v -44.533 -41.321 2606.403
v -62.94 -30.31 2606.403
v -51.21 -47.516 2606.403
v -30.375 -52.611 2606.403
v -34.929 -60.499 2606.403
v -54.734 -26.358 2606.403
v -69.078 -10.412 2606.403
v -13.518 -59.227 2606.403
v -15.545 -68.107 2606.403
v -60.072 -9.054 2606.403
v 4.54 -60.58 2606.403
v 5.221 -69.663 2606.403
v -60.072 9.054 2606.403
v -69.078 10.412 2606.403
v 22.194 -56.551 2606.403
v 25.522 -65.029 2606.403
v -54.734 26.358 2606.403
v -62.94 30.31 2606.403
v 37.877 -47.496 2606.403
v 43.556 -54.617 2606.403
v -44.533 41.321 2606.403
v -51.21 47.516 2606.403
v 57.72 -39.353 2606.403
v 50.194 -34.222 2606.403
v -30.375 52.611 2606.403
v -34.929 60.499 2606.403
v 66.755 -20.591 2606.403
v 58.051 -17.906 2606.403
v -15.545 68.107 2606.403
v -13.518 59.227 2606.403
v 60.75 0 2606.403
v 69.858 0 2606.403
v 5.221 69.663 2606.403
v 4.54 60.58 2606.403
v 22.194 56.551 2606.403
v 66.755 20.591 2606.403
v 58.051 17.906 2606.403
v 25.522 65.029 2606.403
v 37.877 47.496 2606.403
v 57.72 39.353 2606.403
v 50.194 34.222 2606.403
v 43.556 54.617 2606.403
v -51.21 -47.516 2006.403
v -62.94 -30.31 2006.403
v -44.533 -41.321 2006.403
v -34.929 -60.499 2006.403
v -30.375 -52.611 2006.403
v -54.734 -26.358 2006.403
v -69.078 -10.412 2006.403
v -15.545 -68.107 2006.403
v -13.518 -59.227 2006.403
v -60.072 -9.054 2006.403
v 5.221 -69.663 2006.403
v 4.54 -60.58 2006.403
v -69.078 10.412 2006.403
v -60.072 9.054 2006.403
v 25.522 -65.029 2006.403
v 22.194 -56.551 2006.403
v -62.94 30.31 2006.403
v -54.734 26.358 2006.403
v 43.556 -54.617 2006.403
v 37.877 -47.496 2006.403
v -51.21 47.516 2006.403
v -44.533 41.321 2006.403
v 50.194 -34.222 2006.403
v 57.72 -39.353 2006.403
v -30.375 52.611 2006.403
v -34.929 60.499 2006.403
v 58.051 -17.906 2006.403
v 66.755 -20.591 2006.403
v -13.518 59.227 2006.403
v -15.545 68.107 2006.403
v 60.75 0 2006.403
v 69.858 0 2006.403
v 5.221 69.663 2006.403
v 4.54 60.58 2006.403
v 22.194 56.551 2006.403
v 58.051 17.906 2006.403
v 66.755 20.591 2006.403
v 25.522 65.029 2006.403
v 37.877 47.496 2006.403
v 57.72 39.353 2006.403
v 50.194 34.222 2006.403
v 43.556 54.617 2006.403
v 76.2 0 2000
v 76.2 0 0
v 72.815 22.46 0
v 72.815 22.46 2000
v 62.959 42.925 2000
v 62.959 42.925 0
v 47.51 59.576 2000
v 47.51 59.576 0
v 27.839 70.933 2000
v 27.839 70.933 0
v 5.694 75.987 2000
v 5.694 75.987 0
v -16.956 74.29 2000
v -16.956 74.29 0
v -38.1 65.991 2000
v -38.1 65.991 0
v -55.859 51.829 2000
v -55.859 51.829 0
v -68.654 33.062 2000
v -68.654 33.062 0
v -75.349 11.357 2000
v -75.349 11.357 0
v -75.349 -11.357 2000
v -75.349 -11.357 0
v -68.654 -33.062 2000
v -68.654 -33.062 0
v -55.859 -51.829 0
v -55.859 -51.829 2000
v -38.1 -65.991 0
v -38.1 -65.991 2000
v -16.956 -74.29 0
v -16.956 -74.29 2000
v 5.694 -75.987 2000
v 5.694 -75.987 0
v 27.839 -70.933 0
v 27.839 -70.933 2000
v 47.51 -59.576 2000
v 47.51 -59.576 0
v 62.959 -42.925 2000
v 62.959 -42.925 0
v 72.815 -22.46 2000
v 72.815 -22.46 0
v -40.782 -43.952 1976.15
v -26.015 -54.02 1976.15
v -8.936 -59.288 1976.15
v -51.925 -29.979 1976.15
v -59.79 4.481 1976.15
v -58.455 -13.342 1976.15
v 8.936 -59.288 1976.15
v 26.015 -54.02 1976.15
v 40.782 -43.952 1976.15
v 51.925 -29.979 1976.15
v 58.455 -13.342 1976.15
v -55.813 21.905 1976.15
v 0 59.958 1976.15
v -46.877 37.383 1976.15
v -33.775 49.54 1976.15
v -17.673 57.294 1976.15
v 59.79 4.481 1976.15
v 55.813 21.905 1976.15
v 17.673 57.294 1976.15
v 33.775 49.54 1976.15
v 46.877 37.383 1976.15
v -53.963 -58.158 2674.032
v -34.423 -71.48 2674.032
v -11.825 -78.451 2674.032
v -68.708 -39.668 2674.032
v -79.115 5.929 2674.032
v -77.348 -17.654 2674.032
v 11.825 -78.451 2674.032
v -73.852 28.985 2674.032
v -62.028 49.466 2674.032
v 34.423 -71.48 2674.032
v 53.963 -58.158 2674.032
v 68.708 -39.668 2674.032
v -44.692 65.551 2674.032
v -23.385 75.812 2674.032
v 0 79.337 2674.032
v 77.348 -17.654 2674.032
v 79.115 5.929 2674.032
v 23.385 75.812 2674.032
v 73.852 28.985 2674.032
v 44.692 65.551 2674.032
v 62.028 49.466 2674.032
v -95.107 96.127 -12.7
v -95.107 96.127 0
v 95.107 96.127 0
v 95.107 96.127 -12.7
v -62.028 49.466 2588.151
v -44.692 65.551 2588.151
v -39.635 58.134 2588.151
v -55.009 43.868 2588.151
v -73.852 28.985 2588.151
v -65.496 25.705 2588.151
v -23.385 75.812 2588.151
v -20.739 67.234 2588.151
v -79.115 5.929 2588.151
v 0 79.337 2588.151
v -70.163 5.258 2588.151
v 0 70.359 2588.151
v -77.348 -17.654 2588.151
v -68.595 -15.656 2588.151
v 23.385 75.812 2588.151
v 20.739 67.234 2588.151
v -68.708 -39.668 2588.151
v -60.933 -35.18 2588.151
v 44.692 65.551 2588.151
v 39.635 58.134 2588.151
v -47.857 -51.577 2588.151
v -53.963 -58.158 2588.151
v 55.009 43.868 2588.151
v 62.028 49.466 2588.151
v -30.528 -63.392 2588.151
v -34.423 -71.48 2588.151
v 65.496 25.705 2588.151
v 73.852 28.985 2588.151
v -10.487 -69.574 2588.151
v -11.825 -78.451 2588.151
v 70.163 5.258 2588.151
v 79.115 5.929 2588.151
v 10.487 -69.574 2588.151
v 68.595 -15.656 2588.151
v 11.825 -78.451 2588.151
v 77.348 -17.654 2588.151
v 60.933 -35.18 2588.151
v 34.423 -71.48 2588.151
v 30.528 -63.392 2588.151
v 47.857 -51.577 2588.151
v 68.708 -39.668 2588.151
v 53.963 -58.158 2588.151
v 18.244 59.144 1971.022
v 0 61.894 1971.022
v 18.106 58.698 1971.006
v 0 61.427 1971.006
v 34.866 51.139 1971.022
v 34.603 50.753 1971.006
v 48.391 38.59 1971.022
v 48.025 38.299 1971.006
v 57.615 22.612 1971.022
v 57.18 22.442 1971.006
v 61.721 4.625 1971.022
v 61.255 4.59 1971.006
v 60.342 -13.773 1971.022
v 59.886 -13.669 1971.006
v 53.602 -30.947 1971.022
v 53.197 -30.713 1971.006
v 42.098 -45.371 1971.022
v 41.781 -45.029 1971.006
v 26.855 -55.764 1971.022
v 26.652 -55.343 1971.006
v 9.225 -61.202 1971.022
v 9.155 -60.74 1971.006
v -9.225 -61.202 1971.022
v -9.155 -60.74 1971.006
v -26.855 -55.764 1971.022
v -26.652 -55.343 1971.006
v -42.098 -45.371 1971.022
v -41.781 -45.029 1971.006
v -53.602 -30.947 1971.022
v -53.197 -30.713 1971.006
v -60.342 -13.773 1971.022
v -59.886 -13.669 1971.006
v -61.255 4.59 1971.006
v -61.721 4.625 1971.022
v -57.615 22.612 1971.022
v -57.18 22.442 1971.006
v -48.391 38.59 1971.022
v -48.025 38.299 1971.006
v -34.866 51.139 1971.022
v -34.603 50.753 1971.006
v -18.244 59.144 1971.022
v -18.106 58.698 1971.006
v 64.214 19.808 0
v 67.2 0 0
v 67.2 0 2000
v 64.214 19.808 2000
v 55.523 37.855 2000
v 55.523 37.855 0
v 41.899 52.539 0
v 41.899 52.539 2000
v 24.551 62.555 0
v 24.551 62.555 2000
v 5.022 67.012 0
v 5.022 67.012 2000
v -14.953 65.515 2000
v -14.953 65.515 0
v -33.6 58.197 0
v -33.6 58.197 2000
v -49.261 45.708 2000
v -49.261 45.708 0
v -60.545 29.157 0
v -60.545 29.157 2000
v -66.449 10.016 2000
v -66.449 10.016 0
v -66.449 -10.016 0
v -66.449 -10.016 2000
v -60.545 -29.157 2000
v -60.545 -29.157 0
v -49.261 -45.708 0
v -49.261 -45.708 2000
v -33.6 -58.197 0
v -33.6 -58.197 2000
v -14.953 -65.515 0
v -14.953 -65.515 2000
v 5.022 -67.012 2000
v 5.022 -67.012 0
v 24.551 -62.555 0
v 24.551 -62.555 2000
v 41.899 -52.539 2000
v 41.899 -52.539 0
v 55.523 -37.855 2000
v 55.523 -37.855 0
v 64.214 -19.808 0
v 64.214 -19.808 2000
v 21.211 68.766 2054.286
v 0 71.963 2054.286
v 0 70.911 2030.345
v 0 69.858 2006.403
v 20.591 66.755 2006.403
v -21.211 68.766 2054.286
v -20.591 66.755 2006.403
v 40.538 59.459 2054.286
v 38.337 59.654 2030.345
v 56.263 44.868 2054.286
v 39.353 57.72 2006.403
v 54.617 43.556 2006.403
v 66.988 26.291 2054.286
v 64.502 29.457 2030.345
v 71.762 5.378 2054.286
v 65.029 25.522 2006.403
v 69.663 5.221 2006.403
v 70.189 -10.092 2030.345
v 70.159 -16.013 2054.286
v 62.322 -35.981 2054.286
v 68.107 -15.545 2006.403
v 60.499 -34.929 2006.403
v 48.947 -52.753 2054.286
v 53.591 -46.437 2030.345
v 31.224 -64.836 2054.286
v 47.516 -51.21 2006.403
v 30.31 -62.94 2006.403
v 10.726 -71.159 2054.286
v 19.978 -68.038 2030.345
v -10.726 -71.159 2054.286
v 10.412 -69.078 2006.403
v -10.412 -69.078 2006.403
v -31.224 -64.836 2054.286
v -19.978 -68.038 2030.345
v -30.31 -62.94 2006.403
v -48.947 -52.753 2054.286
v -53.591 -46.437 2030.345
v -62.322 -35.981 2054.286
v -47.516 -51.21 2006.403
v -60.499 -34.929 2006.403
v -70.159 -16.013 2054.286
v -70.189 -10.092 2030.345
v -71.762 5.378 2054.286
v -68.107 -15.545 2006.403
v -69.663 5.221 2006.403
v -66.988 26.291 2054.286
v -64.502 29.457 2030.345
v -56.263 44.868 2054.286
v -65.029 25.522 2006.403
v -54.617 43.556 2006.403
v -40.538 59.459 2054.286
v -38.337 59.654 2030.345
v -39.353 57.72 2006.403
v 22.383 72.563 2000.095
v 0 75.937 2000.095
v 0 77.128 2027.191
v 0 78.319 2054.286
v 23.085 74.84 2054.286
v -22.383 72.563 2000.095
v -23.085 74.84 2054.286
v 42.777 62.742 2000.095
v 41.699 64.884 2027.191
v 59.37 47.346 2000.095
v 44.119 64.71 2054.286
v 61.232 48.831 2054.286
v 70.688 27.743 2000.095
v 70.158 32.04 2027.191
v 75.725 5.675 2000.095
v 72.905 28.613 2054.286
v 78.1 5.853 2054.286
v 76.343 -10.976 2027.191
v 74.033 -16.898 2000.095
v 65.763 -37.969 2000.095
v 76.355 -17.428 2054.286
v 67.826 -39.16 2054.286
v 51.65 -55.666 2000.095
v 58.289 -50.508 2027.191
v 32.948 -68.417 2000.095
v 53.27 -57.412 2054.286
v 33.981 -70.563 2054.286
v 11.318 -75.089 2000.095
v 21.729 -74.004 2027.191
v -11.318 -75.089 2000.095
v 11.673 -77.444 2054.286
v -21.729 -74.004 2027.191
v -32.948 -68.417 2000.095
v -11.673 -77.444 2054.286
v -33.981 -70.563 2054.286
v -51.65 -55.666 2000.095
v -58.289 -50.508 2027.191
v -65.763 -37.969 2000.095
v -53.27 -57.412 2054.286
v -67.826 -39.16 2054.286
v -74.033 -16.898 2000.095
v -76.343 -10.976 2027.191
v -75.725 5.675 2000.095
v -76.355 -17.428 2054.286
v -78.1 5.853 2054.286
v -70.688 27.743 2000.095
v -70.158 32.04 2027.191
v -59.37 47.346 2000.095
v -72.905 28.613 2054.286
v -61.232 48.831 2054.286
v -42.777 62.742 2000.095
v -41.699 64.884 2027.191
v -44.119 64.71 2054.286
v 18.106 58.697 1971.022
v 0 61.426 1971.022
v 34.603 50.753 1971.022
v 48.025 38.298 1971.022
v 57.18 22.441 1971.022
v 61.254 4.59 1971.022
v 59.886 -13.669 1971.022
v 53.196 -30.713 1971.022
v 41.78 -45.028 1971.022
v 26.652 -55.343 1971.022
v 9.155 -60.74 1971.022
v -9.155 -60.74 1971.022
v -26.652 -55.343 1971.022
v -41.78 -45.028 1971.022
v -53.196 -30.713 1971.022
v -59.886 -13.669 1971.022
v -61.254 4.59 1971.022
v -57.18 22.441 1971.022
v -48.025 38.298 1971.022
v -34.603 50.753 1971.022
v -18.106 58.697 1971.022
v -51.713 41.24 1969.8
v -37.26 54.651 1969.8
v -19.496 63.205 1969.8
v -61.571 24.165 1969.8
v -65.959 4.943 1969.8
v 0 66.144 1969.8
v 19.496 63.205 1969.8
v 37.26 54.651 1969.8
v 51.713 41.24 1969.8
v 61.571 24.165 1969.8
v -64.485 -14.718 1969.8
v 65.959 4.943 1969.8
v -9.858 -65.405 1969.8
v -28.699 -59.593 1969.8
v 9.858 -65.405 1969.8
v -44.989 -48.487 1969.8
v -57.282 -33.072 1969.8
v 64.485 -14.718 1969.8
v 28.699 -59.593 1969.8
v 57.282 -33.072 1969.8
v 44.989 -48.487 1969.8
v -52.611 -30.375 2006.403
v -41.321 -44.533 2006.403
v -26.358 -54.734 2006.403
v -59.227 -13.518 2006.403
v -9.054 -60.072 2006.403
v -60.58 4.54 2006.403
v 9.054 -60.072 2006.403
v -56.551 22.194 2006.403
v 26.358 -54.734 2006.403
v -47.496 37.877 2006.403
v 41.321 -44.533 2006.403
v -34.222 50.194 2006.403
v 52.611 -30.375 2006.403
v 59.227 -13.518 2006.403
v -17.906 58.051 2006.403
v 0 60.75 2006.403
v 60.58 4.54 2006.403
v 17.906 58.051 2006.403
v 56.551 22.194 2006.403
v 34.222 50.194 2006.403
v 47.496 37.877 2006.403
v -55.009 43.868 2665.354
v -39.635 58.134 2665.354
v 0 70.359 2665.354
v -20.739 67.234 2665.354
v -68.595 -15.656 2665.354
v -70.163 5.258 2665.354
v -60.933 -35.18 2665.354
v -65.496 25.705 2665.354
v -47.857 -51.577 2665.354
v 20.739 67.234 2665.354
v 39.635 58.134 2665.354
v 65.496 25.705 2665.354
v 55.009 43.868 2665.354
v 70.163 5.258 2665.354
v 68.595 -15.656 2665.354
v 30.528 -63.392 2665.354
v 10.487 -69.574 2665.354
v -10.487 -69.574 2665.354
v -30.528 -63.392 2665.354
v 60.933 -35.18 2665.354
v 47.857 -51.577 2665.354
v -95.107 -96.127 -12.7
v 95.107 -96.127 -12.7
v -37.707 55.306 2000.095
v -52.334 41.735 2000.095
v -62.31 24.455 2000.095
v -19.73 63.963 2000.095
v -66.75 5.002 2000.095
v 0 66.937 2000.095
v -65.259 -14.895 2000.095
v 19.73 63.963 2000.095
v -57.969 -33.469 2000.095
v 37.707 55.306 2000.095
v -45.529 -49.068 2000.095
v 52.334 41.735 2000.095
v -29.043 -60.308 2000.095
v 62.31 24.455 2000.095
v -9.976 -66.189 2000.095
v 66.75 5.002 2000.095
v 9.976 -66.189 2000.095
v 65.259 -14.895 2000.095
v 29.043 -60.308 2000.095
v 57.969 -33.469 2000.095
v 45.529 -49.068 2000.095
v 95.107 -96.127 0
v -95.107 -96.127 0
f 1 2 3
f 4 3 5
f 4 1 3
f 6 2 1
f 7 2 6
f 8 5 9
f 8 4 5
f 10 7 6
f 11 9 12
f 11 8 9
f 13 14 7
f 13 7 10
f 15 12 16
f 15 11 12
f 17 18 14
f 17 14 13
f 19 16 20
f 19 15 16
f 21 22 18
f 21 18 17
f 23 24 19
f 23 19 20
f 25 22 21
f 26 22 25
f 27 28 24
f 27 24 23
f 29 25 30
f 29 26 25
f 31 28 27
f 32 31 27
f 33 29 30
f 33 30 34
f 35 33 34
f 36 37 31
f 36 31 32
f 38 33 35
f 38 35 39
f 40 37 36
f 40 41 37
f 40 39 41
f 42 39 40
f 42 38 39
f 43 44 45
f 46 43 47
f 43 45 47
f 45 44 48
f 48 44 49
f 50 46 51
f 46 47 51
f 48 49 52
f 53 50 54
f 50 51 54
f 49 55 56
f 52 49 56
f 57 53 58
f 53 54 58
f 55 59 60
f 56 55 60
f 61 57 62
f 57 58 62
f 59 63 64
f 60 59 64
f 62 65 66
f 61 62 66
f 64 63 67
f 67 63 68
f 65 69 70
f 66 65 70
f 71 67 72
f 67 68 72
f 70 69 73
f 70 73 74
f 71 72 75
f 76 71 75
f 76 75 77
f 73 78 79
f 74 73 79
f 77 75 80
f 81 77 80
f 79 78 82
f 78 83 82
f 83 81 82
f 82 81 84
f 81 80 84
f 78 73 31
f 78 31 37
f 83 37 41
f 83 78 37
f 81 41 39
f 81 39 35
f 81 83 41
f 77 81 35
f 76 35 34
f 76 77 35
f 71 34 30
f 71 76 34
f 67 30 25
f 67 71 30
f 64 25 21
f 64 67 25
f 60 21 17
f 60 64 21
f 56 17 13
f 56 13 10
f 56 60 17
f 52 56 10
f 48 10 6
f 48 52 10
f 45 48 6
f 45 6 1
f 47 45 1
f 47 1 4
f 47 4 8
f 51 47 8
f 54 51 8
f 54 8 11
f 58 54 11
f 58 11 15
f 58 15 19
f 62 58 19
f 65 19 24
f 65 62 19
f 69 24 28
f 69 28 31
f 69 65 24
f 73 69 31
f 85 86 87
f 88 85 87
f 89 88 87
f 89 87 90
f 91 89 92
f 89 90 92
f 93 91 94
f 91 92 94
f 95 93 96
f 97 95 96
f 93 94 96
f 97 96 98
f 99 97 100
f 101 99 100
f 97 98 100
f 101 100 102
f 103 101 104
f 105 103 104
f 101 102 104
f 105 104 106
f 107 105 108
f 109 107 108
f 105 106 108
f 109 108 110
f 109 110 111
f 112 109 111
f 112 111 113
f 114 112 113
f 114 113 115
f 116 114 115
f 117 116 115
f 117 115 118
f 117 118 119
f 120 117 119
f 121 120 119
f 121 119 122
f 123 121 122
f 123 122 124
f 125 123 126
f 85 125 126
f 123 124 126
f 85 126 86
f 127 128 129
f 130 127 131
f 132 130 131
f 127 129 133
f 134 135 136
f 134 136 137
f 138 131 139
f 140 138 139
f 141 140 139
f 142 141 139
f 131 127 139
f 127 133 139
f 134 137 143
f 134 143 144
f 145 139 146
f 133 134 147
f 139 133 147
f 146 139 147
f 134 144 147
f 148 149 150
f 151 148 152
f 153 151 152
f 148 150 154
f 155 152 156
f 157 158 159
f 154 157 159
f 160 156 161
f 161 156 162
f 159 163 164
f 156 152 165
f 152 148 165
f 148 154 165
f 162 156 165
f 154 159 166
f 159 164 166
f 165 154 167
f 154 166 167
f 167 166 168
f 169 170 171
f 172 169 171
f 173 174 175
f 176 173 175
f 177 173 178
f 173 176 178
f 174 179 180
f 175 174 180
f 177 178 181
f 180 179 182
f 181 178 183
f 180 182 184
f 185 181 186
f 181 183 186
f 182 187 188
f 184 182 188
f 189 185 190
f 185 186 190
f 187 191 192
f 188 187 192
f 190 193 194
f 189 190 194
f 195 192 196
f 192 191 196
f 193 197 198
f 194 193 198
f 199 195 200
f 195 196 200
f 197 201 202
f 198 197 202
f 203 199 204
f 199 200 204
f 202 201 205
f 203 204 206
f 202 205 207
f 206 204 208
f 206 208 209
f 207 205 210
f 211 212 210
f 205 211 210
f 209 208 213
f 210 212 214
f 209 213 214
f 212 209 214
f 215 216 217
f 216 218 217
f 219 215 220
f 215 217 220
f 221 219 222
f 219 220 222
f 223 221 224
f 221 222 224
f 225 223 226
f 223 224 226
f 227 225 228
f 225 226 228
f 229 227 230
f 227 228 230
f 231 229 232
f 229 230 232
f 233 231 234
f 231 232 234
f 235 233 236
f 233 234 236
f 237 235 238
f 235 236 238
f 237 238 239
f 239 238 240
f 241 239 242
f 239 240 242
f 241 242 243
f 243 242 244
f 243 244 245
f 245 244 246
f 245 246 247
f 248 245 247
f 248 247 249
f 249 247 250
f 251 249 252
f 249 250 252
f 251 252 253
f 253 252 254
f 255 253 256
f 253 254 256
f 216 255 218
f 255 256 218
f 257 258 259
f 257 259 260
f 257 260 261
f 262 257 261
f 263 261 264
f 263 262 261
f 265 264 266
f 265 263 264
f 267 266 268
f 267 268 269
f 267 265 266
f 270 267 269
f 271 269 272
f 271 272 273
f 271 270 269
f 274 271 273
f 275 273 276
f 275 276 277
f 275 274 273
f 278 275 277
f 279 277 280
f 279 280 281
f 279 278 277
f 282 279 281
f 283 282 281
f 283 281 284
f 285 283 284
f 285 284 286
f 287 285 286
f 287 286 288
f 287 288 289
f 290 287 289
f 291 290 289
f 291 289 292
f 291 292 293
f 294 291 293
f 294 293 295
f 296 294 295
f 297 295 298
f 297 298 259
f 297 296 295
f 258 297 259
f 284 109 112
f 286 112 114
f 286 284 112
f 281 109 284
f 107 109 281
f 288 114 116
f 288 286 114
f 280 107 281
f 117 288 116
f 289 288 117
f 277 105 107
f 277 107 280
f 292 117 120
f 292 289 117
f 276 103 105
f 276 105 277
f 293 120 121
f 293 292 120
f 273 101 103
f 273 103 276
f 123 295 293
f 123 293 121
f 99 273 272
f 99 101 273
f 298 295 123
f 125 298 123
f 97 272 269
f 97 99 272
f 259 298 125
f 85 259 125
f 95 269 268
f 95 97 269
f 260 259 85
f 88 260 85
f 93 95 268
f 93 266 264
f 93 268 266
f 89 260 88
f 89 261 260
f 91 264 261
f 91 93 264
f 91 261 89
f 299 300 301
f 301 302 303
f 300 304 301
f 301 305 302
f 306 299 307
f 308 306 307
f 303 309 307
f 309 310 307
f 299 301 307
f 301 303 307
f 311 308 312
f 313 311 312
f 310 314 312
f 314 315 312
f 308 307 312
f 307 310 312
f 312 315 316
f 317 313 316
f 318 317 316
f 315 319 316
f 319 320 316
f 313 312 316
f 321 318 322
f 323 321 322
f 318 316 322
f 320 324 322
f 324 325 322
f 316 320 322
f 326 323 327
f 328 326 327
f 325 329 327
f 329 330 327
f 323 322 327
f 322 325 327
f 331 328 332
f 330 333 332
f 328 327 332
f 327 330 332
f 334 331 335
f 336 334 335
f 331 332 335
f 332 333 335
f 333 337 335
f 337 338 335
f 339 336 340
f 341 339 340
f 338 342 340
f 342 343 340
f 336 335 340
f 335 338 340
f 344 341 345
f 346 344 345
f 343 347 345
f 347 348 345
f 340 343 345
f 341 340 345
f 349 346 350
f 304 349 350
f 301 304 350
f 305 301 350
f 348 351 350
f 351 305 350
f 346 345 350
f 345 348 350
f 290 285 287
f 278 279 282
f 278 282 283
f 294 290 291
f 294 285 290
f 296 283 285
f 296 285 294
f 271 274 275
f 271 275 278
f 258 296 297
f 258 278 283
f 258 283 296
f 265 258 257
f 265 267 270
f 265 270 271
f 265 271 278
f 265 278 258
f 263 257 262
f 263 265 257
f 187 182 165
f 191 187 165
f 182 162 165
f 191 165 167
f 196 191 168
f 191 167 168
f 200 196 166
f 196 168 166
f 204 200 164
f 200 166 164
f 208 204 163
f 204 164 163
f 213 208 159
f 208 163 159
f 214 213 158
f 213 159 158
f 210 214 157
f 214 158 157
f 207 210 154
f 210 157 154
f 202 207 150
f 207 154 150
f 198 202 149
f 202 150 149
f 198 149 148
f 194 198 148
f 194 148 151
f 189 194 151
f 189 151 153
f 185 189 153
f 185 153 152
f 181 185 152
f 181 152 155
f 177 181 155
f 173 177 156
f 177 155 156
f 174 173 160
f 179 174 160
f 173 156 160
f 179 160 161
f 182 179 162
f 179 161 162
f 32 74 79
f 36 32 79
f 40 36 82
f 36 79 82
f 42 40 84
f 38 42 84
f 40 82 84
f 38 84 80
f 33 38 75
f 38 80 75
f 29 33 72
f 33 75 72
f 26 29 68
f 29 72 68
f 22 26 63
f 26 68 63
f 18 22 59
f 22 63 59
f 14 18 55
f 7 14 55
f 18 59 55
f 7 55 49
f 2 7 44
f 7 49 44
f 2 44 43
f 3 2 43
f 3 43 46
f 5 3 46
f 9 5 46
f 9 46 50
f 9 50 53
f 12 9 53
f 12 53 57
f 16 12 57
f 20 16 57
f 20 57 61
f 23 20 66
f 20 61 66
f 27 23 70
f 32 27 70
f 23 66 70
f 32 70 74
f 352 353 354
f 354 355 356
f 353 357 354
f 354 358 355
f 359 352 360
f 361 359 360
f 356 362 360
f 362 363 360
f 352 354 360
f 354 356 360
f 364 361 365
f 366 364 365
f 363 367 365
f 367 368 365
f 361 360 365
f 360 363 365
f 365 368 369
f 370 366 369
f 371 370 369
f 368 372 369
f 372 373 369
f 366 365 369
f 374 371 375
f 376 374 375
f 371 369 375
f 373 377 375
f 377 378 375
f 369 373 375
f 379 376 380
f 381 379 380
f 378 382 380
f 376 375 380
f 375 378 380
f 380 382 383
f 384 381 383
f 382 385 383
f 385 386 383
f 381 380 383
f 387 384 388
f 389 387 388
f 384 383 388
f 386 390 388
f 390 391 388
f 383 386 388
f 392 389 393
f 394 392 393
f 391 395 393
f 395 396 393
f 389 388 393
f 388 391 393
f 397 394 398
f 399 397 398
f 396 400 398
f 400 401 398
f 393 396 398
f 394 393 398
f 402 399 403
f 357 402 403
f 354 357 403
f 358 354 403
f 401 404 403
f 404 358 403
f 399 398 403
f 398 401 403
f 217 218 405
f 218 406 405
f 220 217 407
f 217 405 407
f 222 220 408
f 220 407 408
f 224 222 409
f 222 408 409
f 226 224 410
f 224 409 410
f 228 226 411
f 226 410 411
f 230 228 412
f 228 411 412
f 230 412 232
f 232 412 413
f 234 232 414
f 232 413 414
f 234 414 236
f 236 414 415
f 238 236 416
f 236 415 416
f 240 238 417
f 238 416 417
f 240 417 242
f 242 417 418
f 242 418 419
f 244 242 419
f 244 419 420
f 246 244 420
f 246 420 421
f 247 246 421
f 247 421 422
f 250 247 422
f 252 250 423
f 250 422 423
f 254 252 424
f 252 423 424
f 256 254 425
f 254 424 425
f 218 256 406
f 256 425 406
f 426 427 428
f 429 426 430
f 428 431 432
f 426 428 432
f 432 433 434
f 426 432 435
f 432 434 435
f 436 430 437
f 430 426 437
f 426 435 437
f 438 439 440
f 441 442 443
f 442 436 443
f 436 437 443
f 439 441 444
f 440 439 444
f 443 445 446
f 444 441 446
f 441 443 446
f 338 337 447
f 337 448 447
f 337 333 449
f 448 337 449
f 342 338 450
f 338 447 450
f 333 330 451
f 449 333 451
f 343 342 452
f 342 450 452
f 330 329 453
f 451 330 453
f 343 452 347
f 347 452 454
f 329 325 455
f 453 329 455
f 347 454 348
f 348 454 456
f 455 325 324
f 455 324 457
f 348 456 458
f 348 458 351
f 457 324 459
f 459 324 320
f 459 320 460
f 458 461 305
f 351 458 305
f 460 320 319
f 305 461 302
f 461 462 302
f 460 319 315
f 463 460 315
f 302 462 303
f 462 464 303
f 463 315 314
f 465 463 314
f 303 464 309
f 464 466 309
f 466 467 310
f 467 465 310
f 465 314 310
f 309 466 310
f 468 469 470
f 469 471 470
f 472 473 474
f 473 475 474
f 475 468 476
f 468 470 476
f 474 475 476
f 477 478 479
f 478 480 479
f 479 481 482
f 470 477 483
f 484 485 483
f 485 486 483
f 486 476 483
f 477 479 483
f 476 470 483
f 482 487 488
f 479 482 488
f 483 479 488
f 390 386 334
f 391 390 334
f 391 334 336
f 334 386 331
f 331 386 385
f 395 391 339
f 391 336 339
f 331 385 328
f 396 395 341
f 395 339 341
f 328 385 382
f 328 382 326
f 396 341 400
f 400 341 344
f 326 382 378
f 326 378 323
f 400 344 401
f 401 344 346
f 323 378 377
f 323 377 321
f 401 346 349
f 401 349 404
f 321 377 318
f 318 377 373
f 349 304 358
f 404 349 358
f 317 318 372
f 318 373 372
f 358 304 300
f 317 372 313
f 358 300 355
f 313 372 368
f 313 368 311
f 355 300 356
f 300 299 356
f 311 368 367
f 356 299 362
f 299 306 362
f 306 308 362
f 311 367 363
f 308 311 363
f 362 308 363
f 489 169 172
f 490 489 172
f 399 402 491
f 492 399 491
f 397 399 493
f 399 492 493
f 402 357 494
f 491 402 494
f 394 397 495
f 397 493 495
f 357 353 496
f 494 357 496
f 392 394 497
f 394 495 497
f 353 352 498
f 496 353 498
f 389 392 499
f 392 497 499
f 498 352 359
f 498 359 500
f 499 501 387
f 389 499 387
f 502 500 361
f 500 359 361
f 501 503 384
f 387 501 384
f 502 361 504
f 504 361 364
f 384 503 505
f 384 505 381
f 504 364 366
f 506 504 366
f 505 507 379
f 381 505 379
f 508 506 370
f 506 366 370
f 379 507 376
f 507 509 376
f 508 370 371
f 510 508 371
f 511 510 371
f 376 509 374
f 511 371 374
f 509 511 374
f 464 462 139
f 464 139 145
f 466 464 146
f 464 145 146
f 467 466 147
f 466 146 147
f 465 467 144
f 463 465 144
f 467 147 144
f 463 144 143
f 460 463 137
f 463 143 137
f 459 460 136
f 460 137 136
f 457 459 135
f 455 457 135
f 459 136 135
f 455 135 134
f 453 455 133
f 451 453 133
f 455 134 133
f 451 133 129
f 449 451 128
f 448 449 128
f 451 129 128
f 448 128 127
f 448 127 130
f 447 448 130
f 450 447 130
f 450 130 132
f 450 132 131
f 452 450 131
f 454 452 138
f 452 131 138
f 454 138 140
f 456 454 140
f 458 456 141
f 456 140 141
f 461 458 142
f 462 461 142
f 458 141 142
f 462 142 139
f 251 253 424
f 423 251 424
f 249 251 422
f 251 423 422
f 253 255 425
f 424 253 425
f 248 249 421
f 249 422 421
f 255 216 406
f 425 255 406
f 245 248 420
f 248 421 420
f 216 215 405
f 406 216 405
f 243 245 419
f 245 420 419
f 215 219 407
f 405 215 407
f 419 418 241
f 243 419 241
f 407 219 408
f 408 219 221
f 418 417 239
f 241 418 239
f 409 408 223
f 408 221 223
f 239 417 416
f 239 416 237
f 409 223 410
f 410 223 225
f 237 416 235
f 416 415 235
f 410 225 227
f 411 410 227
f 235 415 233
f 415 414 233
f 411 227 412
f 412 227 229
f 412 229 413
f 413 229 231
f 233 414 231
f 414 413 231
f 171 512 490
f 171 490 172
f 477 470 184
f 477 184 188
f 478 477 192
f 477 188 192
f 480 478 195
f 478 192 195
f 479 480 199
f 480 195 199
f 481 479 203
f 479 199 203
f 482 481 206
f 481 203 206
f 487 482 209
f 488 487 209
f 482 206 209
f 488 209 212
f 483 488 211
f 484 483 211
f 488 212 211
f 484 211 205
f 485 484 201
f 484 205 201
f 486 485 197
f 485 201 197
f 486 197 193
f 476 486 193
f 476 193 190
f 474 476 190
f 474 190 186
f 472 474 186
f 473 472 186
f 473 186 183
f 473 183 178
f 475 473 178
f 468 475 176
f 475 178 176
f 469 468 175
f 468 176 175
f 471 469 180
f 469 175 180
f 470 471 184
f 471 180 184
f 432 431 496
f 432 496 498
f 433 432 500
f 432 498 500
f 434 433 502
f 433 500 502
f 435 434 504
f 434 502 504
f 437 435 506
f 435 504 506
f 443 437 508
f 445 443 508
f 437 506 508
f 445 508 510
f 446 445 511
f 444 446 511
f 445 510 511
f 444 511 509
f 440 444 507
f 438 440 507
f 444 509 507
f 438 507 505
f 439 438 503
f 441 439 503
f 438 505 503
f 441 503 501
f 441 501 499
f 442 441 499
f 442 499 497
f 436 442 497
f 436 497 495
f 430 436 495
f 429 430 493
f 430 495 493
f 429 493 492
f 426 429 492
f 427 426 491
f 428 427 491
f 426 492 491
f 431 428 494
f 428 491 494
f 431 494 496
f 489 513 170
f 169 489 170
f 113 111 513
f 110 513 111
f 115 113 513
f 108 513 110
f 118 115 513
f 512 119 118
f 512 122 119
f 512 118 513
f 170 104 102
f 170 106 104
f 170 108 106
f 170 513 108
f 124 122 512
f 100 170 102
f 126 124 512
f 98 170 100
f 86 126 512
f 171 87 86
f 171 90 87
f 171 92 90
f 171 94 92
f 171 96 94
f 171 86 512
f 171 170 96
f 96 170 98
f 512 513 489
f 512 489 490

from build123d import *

# Parameters (mm, degrees)
F0_R        = 76.2
F0_R_2      = 67.2
F1_DEPTH    = 2000
F2_W        = 190.213978
F2_H        = 192.253948
F3_DEPTH    = 12.7
F5_FACE_R   = 69.858185
F5_FACE_R_2 = 60.750059
F6_DEPTH    = 600


with BuildPart() as f1:
    # F0 (on Top) → F1 (new body)
    with BuildSketch(Plane.XY):
        Circle(F0_R)
        Circle(F0_R_2, mode=Mode.SUBTRACT)
    extrude(amount=F1_DEPTH)

    # F2 (on Top) → F3 (join)
    with BuildSketch(Plane.XY):
        Rectangle(F2_W, F2_H)
    extrude(amount=-F3_DEPTH)


with BuildPart() as f5:
    # F4 (on Right) → F5 (revolve)
    with BuildSketch(Plane.YZ):
        Polygon((66.937063, 2000.095129), (75.937063, 2000.095129), (78.319028, 2054.286242), (71.962895, 2054.286242), (69.858185, 2006.402849), (60.750059, 2006.402849), (59.957865, 1976.150161), (0, 1976.150161), (0, 1969.800161), (66.143761, 1969.800161), align=None)
        Polygon((61.426011, 1971.021891), (61.893776, 1971.021891), (61.42658, 1971.005576), align=None, mode=Mode.SUBTRACT)
    revolve(axis=Axis((0, 0, 2033.346772), (0, 0, -1)))


with BuildPart() as f6:
    # F5_face (on face) → F6 (new body)
    with BuildSketch(Plane.XY.offset(2006.402849)):
        Circle(F5_FACE_R)
        Circle(F5_FACE_R_2, mode=Mode.SUBTRACT)
    extrude(amount=F6_DEPTH)


with BuildPart() as f8:
    # F7 (on Right) → F8 (revolve)
    with BuildSketch(Plane.YZ):
        Polygon((70.359498, 2665.35449), (70.359498, 2588.150978), (79.336651, 2588.150978), (79.336651, 2674.03245), (0, 2674.03245), (0, 2665.35449), align=None)
    revolve(axis=Axis((0, 0, 2669.69347), (0, 0, -1)))


solid = Compound([f1.part, f5.part, f6.part, f8.part])
